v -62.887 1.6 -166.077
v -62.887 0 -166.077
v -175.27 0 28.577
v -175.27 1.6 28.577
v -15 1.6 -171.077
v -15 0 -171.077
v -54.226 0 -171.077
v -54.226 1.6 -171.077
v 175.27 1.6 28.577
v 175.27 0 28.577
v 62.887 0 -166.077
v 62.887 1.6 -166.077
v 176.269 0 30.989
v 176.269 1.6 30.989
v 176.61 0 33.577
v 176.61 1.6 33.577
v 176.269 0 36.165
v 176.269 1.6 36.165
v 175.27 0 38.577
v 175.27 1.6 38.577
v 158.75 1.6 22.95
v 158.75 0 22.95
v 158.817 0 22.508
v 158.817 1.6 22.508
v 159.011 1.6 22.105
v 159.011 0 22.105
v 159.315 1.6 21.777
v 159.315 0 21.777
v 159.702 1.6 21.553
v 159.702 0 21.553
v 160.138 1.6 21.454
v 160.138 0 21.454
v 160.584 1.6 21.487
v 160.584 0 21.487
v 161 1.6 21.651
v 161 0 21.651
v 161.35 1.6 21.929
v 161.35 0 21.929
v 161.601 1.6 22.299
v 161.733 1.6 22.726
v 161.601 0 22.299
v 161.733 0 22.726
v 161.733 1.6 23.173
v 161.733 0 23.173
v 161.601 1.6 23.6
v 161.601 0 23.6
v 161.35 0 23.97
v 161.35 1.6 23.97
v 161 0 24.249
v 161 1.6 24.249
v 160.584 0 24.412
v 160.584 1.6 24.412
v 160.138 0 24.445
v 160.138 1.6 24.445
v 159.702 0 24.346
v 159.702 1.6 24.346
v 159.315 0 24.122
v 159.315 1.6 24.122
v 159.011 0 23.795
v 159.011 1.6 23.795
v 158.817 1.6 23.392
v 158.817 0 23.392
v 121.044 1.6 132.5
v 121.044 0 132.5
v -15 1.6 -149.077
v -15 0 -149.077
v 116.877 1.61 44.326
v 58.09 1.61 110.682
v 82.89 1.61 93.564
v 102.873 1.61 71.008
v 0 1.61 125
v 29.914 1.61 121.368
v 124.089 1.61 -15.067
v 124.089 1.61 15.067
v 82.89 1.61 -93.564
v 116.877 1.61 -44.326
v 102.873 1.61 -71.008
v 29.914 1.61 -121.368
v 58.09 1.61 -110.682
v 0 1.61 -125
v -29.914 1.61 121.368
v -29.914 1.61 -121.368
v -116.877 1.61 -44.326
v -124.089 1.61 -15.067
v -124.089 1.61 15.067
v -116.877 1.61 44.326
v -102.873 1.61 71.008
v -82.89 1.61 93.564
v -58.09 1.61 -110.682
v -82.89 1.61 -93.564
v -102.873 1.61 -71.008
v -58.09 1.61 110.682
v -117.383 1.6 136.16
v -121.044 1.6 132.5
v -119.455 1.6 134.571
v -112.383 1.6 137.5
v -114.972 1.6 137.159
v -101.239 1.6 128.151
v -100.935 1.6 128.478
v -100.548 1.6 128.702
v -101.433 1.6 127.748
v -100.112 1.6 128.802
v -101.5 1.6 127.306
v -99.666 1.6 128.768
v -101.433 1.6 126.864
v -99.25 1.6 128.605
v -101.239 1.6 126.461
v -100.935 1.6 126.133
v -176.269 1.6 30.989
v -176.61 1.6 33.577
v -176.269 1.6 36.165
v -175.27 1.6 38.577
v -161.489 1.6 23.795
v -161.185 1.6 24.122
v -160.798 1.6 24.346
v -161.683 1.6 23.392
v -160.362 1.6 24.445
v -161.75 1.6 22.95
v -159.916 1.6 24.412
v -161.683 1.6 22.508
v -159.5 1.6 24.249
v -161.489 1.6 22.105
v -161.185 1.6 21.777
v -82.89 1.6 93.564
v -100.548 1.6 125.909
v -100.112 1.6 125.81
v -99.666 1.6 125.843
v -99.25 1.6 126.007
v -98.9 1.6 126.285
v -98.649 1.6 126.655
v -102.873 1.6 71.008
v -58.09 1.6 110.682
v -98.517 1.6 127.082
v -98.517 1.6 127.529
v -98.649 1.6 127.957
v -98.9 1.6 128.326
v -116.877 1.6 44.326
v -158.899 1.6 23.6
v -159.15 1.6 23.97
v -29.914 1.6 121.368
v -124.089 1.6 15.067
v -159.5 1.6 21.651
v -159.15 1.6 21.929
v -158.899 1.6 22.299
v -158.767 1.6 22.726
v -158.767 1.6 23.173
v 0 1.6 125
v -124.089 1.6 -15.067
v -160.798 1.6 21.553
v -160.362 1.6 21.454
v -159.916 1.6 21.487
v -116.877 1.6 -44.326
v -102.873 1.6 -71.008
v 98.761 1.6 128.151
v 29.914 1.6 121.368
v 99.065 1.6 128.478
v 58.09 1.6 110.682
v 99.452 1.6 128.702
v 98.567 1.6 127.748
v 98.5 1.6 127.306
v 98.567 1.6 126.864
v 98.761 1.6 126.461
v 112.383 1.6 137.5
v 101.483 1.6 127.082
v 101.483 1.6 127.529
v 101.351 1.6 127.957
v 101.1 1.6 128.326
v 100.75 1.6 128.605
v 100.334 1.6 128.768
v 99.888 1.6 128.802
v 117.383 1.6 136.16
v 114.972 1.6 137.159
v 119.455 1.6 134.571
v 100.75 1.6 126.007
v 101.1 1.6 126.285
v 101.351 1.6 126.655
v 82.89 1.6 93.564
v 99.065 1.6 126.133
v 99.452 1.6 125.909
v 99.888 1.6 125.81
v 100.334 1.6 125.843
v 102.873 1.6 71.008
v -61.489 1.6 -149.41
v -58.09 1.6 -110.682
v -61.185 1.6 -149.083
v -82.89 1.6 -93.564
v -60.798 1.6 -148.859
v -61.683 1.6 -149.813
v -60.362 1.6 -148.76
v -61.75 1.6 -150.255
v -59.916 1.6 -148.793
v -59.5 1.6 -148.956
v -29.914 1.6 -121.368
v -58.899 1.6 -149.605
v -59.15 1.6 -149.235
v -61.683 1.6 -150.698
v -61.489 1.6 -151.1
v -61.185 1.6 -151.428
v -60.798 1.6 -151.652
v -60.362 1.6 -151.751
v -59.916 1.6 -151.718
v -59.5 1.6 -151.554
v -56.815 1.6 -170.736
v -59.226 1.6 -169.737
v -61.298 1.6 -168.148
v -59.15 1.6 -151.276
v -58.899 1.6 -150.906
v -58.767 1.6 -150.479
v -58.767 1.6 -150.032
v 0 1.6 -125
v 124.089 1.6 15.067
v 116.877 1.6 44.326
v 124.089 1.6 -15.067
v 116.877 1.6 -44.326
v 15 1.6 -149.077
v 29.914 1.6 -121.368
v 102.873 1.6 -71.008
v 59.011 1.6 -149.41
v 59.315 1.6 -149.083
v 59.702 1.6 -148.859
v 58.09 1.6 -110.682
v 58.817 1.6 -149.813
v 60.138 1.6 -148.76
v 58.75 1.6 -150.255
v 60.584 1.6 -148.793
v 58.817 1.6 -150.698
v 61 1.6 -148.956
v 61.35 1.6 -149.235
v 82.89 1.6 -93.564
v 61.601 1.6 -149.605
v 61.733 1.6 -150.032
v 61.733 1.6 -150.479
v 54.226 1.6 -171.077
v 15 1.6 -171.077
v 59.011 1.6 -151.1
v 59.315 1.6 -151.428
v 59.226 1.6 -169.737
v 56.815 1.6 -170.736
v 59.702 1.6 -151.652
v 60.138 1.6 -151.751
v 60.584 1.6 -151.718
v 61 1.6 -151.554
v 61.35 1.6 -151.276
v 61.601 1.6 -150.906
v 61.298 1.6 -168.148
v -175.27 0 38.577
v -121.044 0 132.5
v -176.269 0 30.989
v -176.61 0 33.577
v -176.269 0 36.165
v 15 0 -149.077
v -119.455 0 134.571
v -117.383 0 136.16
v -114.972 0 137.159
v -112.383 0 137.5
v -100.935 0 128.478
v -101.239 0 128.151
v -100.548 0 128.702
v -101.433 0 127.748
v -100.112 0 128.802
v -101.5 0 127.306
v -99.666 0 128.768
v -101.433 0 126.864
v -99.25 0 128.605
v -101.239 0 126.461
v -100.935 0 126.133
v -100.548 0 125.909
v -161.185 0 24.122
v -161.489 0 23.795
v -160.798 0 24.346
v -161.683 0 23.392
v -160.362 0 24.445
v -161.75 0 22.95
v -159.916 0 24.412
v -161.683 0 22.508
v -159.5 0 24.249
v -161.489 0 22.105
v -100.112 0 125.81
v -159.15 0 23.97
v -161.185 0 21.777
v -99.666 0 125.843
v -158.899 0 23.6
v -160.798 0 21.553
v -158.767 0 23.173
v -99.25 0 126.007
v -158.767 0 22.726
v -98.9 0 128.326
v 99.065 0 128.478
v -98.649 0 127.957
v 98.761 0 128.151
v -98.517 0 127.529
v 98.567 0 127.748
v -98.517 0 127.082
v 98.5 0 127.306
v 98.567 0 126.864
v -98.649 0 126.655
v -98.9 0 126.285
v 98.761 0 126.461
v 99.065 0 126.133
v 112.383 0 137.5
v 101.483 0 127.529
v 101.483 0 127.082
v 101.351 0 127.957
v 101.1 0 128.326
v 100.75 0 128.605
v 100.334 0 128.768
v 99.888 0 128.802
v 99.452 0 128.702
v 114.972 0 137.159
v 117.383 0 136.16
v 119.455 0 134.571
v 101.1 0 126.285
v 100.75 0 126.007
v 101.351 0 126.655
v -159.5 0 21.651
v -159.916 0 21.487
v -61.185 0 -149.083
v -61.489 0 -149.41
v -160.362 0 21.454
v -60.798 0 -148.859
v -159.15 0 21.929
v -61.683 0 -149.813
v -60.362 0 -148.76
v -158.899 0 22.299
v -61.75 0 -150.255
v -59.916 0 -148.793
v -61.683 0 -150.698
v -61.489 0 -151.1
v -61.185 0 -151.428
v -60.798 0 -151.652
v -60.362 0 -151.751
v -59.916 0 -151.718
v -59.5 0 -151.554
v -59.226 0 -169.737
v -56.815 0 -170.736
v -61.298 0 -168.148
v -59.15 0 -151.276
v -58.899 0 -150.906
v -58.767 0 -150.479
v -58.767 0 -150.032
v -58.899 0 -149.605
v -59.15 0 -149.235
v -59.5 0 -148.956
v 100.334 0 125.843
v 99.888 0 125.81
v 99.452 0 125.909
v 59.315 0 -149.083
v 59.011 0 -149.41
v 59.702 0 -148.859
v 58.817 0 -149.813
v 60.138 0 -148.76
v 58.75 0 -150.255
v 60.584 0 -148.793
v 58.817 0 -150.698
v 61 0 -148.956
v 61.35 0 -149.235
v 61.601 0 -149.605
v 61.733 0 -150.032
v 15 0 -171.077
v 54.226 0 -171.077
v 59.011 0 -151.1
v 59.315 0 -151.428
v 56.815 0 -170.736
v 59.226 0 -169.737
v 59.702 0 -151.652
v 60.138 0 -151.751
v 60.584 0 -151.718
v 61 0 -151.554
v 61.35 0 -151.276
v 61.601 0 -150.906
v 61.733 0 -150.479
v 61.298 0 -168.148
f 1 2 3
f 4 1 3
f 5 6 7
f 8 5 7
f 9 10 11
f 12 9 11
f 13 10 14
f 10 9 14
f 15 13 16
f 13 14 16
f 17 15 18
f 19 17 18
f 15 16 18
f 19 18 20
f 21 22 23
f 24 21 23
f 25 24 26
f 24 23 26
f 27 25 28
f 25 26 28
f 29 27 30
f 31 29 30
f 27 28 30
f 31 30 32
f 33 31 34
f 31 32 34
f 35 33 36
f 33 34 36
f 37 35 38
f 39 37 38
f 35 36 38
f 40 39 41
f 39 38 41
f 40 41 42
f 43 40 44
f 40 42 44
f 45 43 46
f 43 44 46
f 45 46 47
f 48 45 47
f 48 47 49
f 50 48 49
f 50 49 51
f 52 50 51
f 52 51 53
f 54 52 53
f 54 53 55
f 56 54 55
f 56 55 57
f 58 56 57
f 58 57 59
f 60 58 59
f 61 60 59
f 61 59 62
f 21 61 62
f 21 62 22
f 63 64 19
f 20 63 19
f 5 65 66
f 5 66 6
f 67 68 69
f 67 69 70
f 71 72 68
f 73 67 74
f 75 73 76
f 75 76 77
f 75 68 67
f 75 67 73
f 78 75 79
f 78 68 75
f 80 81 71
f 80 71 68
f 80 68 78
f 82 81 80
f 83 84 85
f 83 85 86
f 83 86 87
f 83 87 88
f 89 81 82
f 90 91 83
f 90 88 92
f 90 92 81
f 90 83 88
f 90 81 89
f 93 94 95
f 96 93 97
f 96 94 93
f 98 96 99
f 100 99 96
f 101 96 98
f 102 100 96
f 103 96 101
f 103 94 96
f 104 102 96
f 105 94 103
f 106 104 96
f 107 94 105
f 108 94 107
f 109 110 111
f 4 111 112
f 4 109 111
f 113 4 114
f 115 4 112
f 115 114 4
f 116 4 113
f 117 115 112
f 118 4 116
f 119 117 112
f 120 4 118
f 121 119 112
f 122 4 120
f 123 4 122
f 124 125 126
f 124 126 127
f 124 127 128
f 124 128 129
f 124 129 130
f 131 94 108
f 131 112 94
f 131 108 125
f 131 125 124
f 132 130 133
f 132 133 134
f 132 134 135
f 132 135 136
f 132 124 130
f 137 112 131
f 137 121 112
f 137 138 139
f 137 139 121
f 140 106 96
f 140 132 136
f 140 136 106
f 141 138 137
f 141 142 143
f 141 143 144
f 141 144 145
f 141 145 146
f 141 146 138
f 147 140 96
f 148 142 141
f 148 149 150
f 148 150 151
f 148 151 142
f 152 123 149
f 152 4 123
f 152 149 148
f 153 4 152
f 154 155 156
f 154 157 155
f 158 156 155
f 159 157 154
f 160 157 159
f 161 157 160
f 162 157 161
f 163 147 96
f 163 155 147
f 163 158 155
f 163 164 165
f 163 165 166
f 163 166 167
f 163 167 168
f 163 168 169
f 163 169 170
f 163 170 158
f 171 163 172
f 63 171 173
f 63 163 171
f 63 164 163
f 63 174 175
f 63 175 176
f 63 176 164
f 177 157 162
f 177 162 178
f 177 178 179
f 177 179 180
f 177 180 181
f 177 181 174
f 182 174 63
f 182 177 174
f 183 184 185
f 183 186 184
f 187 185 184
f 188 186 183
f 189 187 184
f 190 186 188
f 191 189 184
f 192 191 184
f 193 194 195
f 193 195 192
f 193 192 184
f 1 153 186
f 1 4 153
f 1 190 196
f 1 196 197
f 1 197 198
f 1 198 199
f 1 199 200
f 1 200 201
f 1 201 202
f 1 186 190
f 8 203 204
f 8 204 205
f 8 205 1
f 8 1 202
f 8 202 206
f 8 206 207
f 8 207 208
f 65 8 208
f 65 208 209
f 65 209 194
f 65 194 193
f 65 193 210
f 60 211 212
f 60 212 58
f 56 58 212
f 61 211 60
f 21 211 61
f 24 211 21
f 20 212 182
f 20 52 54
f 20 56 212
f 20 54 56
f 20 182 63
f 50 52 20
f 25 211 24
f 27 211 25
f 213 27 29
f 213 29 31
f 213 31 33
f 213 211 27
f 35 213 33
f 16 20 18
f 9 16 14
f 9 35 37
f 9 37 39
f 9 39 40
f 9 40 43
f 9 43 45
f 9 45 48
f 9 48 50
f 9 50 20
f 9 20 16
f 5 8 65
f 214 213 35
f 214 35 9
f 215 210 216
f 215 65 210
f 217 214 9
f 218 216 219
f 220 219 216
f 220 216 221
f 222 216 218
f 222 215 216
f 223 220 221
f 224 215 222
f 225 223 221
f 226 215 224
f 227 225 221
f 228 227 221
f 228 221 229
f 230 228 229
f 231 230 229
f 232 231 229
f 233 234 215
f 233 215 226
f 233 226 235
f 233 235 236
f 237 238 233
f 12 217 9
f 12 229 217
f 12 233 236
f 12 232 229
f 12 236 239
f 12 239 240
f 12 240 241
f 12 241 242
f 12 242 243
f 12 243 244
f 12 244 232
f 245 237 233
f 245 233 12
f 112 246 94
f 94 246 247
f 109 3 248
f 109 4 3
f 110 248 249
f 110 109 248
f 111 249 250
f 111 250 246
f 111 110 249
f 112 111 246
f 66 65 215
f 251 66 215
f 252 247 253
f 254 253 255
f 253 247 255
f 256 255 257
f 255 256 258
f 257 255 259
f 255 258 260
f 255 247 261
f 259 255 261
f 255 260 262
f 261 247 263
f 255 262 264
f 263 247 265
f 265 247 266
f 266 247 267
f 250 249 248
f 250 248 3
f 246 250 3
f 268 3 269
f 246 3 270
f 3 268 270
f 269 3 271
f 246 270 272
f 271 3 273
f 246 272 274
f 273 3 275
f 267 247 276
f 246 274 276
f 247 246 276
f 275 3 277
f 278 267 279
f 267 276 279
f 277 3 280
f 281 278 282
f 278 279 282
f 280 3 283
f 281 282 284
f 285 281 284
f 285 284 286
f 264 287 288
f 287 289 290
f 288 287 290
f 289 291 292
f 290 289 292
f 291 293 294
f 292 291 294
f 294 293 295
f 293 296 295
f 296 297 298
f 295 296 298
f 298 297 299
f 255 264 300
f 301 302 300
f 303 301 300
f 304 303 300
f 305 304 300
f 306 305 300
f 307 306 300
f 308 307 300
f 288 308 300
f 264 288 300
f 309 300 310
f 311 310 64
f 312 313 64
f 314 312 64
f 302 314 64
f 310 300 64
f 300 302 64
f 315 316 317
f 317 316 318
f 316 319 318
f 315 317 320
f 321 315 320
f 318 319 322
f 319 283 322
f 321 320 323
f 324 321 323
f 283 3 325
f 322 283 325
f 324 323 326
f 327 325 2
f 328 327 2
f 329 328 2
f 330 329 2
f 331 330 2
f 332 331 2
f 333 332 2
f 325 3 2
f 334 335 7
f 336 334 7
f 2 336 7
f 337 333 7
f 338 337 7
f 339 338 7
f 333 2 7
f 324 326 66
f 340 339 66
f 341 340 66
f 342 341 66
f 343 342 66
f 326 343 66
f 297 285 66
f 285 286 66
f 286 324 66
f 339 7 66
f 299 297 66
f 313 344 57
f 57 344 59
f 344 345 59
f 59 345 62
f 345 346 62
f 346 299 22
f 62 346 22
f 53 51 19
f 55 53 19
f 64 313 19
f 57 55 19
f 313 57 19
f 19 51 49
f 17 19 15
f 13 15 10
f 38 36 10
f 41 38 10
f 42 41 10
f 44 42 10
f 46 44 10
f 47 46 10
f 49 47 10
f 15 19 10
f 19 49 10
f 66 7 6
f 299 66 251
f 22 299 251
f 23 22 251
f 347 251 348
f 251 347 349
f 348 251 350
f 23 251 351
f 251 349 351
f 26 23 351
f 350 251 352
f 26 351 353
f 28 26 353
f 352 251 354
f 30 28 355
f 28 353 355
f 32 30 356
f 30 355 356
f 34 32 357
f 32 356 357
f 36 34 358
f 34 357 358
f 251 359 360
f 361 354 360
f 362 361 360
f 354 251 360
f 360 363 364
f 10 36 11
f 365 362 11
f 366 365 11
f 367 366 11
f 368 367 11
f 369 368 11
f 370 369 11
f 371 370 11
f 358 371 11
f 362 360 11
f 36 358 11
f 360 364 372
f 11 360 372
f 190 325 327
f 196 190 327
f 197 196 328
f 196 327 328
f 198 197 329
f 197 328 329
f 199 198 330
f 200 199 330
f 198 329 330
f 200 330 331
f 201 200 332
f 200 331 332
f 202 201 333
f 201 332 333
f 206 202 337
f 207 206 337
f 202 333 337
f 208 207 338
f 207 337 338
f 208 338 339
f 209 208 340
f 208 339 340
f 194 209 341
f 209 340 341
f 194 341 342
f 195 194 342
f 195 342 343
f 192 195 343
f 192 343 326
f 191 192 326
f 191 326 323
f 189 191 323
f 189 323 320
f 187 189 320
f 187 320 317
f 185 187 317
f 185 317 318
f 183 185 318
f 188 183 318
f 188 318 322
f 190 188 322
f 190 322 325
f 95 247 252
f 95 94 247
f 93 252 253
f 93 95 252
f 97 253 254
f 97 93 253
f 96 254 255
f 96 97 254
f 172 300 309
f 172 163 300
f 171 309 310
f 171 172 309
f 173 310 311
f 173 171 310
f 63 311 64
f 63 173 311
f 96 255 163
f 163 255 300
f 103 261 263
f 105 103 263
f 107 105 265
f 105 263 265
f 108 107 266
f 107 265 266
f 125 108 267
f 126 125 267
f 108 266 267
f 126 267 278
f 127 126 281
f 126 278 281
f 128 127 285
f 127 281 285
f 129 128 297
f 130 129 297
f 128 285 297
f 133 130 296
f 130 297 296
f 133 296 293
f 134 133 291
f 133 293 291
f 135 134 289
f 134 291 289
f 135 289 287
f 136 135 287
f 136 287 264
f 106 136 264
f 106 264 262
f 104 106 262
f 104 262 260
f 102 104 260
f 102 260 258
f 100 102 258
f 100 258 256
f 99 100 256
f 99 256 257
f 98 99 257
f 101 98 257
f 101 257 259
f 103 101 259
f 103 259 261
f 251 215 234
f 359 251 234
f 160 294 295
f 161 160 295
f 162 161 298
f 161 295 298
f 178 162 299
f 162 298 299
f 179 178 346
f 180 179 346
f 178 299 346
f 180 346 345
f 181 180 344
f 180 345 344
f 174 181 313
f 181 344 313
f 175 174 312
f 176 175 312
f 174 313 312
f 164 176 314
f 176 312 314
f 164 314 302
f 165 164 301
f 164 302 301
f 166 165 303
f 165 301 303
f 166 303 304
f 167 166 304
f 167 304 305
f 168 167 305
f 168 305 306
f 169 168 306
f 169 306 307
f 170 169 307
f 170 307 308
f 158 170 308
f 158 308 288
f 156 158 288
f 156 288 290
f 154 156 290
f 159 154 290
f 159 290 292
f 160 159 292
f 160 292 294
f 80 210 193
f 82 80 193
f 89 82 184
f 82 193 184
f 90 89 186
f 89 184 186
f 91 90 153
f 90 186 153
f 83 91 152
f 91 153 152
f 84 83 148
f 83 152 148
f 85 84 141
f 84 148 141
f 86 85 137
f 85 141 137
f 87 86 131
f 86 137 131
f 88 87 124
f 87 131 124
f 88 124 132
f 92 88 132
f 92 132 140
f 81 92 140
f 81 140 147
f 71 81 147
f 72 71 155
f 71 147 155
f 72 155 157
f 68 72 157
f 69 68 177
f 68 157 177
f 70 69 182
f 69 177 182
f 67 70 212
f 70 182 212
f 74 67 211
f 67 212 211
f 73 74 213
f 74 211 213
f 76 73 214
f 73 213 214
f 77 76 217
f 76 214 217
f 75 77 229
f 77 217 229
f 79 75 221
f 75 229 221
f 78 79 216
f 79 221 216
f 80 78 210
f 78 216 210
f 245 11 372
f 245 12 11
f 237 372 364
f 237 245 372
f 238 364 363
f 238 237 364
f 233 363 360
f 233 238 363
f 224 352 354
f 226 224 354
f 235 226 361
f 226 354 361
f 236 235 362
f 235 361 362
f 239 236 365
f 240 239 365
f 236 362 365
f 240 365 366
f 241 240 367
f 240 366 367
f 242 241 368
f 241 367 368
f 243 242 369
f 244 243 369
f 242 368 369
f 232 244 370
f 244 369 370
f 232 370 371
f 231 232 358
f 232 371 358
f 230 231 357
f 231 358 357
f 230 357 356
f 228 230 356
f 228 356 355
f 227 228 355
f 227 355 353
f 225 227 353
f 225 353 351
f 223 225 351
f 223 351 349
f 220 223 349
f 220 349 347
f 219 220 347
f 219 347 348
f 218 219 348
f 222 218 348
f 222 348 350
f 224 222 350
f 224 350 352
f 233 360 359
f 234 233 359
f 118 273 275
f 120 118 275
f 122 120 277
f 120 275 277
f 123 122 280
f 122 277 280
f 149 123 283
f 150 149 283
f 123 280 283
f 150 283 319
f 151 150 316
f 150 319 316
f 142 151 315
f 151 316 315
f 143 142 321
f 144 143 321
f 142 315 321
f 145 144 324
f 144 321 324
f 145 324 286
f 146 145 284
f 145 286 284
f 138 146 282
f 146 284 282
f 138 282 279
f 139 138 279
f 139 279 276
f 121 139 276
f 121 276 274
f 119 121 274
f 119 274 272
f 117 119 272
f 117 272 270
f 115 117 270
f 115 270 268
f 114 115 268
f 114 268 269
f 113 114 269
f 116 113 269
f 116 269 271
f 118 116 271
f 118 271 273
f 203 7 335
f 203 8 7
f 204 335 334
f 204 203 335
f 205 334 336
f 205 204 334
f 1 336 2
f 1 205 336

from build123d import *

# Parameters (mm, degrees)
EXTRUDE_385_DEPTH   = 1.6
FILLET_1_R          = 10
SKETCH_2_W          = 30
SKETCH_2_H          = 22
CUT_EXTRUDE_1_DEPTH = 246.888122157
SKETCH_3_R          = 125
EXTRUDE_1240_DEPTH  = 0.01
HOLE_WIZARD_3_D     = 3


with BuildPart() as part:
    # Эскиз1 → Extrude 385 (new body)
    with BuildSketch(Plane(origin=(0, 0, 0), x_dir=(1, 0, 0), z_dir=(0, 1, 0))):
        Polygon((178.156986041, -33.576951546), (60, 171.076951546), (-60, 171.076951546), (-178.156986041, -33.576951546), (-118.156986041, -137.5), (118.156986041, -137.5), align=None)
    extrude(amount=EXTRUDE_385_DEPTH)

    # Скругление1
    fillet_1_edges = [part.edges().sort_by_distance(p)[0] for p in [
        (118.156986041, 0.8, 137.5),
        (-118.156986041, 0.8, 137.5),
        (-178.156986041, 0.8, 33.576951546),
        (-60, 0.8, -171.076951546),
        (60, 0.8, -171.076951546),
        (178.156986041, 0.8, 33.576951546),
    ]]
    fillet(fillet_1_edges, radius=FILLET_1_R)

    # Эскиз2 → Вырез-Вытянуть1 (cut, through all)
    with BuildSketch(Plane(origin=(0, 1.6, 0), x_dir=(1, 0, 0), z_dir=(0, 1, 0))):
        with Locations((0, 160.076951546)):
            Rectangle(SKETCH_2_W, SKETCH_2_H)
    extrude(amount=-CUT_EXTRUDE_1_DEPTH, mode=Mode.SUBTRACT)

    # Эскиз3 → Extrude 1240 (add)
    with BuildSketch(Plane(origin=(0, 1.6, 0), x_dir=(1, 0, 0), z_dir=(0, 1, 0))):
        with Locations(Location((0, 0, 0), (0, 0, 90))):
            Circle(SKETCH_3_R)
    extrude(amount=EXTRUDE_1240_DEPTH)

    # Отверстие 3мм (through all)
    with Locations(Plane(origin=(0, 1.6, 0), x_dir=(1, 0, 0), z_dir=(0, 1, 0))):
        with Locations((-60.25, 150.255407557), (60.25, 150.255407557), (160.25, -22.9496732), (100, -127.305734356), (-100, -127.305734356), (-160.25, -22.9496732)):
            Hole(HOLE_WIZARD_3_D / 2)


solid = part.part
